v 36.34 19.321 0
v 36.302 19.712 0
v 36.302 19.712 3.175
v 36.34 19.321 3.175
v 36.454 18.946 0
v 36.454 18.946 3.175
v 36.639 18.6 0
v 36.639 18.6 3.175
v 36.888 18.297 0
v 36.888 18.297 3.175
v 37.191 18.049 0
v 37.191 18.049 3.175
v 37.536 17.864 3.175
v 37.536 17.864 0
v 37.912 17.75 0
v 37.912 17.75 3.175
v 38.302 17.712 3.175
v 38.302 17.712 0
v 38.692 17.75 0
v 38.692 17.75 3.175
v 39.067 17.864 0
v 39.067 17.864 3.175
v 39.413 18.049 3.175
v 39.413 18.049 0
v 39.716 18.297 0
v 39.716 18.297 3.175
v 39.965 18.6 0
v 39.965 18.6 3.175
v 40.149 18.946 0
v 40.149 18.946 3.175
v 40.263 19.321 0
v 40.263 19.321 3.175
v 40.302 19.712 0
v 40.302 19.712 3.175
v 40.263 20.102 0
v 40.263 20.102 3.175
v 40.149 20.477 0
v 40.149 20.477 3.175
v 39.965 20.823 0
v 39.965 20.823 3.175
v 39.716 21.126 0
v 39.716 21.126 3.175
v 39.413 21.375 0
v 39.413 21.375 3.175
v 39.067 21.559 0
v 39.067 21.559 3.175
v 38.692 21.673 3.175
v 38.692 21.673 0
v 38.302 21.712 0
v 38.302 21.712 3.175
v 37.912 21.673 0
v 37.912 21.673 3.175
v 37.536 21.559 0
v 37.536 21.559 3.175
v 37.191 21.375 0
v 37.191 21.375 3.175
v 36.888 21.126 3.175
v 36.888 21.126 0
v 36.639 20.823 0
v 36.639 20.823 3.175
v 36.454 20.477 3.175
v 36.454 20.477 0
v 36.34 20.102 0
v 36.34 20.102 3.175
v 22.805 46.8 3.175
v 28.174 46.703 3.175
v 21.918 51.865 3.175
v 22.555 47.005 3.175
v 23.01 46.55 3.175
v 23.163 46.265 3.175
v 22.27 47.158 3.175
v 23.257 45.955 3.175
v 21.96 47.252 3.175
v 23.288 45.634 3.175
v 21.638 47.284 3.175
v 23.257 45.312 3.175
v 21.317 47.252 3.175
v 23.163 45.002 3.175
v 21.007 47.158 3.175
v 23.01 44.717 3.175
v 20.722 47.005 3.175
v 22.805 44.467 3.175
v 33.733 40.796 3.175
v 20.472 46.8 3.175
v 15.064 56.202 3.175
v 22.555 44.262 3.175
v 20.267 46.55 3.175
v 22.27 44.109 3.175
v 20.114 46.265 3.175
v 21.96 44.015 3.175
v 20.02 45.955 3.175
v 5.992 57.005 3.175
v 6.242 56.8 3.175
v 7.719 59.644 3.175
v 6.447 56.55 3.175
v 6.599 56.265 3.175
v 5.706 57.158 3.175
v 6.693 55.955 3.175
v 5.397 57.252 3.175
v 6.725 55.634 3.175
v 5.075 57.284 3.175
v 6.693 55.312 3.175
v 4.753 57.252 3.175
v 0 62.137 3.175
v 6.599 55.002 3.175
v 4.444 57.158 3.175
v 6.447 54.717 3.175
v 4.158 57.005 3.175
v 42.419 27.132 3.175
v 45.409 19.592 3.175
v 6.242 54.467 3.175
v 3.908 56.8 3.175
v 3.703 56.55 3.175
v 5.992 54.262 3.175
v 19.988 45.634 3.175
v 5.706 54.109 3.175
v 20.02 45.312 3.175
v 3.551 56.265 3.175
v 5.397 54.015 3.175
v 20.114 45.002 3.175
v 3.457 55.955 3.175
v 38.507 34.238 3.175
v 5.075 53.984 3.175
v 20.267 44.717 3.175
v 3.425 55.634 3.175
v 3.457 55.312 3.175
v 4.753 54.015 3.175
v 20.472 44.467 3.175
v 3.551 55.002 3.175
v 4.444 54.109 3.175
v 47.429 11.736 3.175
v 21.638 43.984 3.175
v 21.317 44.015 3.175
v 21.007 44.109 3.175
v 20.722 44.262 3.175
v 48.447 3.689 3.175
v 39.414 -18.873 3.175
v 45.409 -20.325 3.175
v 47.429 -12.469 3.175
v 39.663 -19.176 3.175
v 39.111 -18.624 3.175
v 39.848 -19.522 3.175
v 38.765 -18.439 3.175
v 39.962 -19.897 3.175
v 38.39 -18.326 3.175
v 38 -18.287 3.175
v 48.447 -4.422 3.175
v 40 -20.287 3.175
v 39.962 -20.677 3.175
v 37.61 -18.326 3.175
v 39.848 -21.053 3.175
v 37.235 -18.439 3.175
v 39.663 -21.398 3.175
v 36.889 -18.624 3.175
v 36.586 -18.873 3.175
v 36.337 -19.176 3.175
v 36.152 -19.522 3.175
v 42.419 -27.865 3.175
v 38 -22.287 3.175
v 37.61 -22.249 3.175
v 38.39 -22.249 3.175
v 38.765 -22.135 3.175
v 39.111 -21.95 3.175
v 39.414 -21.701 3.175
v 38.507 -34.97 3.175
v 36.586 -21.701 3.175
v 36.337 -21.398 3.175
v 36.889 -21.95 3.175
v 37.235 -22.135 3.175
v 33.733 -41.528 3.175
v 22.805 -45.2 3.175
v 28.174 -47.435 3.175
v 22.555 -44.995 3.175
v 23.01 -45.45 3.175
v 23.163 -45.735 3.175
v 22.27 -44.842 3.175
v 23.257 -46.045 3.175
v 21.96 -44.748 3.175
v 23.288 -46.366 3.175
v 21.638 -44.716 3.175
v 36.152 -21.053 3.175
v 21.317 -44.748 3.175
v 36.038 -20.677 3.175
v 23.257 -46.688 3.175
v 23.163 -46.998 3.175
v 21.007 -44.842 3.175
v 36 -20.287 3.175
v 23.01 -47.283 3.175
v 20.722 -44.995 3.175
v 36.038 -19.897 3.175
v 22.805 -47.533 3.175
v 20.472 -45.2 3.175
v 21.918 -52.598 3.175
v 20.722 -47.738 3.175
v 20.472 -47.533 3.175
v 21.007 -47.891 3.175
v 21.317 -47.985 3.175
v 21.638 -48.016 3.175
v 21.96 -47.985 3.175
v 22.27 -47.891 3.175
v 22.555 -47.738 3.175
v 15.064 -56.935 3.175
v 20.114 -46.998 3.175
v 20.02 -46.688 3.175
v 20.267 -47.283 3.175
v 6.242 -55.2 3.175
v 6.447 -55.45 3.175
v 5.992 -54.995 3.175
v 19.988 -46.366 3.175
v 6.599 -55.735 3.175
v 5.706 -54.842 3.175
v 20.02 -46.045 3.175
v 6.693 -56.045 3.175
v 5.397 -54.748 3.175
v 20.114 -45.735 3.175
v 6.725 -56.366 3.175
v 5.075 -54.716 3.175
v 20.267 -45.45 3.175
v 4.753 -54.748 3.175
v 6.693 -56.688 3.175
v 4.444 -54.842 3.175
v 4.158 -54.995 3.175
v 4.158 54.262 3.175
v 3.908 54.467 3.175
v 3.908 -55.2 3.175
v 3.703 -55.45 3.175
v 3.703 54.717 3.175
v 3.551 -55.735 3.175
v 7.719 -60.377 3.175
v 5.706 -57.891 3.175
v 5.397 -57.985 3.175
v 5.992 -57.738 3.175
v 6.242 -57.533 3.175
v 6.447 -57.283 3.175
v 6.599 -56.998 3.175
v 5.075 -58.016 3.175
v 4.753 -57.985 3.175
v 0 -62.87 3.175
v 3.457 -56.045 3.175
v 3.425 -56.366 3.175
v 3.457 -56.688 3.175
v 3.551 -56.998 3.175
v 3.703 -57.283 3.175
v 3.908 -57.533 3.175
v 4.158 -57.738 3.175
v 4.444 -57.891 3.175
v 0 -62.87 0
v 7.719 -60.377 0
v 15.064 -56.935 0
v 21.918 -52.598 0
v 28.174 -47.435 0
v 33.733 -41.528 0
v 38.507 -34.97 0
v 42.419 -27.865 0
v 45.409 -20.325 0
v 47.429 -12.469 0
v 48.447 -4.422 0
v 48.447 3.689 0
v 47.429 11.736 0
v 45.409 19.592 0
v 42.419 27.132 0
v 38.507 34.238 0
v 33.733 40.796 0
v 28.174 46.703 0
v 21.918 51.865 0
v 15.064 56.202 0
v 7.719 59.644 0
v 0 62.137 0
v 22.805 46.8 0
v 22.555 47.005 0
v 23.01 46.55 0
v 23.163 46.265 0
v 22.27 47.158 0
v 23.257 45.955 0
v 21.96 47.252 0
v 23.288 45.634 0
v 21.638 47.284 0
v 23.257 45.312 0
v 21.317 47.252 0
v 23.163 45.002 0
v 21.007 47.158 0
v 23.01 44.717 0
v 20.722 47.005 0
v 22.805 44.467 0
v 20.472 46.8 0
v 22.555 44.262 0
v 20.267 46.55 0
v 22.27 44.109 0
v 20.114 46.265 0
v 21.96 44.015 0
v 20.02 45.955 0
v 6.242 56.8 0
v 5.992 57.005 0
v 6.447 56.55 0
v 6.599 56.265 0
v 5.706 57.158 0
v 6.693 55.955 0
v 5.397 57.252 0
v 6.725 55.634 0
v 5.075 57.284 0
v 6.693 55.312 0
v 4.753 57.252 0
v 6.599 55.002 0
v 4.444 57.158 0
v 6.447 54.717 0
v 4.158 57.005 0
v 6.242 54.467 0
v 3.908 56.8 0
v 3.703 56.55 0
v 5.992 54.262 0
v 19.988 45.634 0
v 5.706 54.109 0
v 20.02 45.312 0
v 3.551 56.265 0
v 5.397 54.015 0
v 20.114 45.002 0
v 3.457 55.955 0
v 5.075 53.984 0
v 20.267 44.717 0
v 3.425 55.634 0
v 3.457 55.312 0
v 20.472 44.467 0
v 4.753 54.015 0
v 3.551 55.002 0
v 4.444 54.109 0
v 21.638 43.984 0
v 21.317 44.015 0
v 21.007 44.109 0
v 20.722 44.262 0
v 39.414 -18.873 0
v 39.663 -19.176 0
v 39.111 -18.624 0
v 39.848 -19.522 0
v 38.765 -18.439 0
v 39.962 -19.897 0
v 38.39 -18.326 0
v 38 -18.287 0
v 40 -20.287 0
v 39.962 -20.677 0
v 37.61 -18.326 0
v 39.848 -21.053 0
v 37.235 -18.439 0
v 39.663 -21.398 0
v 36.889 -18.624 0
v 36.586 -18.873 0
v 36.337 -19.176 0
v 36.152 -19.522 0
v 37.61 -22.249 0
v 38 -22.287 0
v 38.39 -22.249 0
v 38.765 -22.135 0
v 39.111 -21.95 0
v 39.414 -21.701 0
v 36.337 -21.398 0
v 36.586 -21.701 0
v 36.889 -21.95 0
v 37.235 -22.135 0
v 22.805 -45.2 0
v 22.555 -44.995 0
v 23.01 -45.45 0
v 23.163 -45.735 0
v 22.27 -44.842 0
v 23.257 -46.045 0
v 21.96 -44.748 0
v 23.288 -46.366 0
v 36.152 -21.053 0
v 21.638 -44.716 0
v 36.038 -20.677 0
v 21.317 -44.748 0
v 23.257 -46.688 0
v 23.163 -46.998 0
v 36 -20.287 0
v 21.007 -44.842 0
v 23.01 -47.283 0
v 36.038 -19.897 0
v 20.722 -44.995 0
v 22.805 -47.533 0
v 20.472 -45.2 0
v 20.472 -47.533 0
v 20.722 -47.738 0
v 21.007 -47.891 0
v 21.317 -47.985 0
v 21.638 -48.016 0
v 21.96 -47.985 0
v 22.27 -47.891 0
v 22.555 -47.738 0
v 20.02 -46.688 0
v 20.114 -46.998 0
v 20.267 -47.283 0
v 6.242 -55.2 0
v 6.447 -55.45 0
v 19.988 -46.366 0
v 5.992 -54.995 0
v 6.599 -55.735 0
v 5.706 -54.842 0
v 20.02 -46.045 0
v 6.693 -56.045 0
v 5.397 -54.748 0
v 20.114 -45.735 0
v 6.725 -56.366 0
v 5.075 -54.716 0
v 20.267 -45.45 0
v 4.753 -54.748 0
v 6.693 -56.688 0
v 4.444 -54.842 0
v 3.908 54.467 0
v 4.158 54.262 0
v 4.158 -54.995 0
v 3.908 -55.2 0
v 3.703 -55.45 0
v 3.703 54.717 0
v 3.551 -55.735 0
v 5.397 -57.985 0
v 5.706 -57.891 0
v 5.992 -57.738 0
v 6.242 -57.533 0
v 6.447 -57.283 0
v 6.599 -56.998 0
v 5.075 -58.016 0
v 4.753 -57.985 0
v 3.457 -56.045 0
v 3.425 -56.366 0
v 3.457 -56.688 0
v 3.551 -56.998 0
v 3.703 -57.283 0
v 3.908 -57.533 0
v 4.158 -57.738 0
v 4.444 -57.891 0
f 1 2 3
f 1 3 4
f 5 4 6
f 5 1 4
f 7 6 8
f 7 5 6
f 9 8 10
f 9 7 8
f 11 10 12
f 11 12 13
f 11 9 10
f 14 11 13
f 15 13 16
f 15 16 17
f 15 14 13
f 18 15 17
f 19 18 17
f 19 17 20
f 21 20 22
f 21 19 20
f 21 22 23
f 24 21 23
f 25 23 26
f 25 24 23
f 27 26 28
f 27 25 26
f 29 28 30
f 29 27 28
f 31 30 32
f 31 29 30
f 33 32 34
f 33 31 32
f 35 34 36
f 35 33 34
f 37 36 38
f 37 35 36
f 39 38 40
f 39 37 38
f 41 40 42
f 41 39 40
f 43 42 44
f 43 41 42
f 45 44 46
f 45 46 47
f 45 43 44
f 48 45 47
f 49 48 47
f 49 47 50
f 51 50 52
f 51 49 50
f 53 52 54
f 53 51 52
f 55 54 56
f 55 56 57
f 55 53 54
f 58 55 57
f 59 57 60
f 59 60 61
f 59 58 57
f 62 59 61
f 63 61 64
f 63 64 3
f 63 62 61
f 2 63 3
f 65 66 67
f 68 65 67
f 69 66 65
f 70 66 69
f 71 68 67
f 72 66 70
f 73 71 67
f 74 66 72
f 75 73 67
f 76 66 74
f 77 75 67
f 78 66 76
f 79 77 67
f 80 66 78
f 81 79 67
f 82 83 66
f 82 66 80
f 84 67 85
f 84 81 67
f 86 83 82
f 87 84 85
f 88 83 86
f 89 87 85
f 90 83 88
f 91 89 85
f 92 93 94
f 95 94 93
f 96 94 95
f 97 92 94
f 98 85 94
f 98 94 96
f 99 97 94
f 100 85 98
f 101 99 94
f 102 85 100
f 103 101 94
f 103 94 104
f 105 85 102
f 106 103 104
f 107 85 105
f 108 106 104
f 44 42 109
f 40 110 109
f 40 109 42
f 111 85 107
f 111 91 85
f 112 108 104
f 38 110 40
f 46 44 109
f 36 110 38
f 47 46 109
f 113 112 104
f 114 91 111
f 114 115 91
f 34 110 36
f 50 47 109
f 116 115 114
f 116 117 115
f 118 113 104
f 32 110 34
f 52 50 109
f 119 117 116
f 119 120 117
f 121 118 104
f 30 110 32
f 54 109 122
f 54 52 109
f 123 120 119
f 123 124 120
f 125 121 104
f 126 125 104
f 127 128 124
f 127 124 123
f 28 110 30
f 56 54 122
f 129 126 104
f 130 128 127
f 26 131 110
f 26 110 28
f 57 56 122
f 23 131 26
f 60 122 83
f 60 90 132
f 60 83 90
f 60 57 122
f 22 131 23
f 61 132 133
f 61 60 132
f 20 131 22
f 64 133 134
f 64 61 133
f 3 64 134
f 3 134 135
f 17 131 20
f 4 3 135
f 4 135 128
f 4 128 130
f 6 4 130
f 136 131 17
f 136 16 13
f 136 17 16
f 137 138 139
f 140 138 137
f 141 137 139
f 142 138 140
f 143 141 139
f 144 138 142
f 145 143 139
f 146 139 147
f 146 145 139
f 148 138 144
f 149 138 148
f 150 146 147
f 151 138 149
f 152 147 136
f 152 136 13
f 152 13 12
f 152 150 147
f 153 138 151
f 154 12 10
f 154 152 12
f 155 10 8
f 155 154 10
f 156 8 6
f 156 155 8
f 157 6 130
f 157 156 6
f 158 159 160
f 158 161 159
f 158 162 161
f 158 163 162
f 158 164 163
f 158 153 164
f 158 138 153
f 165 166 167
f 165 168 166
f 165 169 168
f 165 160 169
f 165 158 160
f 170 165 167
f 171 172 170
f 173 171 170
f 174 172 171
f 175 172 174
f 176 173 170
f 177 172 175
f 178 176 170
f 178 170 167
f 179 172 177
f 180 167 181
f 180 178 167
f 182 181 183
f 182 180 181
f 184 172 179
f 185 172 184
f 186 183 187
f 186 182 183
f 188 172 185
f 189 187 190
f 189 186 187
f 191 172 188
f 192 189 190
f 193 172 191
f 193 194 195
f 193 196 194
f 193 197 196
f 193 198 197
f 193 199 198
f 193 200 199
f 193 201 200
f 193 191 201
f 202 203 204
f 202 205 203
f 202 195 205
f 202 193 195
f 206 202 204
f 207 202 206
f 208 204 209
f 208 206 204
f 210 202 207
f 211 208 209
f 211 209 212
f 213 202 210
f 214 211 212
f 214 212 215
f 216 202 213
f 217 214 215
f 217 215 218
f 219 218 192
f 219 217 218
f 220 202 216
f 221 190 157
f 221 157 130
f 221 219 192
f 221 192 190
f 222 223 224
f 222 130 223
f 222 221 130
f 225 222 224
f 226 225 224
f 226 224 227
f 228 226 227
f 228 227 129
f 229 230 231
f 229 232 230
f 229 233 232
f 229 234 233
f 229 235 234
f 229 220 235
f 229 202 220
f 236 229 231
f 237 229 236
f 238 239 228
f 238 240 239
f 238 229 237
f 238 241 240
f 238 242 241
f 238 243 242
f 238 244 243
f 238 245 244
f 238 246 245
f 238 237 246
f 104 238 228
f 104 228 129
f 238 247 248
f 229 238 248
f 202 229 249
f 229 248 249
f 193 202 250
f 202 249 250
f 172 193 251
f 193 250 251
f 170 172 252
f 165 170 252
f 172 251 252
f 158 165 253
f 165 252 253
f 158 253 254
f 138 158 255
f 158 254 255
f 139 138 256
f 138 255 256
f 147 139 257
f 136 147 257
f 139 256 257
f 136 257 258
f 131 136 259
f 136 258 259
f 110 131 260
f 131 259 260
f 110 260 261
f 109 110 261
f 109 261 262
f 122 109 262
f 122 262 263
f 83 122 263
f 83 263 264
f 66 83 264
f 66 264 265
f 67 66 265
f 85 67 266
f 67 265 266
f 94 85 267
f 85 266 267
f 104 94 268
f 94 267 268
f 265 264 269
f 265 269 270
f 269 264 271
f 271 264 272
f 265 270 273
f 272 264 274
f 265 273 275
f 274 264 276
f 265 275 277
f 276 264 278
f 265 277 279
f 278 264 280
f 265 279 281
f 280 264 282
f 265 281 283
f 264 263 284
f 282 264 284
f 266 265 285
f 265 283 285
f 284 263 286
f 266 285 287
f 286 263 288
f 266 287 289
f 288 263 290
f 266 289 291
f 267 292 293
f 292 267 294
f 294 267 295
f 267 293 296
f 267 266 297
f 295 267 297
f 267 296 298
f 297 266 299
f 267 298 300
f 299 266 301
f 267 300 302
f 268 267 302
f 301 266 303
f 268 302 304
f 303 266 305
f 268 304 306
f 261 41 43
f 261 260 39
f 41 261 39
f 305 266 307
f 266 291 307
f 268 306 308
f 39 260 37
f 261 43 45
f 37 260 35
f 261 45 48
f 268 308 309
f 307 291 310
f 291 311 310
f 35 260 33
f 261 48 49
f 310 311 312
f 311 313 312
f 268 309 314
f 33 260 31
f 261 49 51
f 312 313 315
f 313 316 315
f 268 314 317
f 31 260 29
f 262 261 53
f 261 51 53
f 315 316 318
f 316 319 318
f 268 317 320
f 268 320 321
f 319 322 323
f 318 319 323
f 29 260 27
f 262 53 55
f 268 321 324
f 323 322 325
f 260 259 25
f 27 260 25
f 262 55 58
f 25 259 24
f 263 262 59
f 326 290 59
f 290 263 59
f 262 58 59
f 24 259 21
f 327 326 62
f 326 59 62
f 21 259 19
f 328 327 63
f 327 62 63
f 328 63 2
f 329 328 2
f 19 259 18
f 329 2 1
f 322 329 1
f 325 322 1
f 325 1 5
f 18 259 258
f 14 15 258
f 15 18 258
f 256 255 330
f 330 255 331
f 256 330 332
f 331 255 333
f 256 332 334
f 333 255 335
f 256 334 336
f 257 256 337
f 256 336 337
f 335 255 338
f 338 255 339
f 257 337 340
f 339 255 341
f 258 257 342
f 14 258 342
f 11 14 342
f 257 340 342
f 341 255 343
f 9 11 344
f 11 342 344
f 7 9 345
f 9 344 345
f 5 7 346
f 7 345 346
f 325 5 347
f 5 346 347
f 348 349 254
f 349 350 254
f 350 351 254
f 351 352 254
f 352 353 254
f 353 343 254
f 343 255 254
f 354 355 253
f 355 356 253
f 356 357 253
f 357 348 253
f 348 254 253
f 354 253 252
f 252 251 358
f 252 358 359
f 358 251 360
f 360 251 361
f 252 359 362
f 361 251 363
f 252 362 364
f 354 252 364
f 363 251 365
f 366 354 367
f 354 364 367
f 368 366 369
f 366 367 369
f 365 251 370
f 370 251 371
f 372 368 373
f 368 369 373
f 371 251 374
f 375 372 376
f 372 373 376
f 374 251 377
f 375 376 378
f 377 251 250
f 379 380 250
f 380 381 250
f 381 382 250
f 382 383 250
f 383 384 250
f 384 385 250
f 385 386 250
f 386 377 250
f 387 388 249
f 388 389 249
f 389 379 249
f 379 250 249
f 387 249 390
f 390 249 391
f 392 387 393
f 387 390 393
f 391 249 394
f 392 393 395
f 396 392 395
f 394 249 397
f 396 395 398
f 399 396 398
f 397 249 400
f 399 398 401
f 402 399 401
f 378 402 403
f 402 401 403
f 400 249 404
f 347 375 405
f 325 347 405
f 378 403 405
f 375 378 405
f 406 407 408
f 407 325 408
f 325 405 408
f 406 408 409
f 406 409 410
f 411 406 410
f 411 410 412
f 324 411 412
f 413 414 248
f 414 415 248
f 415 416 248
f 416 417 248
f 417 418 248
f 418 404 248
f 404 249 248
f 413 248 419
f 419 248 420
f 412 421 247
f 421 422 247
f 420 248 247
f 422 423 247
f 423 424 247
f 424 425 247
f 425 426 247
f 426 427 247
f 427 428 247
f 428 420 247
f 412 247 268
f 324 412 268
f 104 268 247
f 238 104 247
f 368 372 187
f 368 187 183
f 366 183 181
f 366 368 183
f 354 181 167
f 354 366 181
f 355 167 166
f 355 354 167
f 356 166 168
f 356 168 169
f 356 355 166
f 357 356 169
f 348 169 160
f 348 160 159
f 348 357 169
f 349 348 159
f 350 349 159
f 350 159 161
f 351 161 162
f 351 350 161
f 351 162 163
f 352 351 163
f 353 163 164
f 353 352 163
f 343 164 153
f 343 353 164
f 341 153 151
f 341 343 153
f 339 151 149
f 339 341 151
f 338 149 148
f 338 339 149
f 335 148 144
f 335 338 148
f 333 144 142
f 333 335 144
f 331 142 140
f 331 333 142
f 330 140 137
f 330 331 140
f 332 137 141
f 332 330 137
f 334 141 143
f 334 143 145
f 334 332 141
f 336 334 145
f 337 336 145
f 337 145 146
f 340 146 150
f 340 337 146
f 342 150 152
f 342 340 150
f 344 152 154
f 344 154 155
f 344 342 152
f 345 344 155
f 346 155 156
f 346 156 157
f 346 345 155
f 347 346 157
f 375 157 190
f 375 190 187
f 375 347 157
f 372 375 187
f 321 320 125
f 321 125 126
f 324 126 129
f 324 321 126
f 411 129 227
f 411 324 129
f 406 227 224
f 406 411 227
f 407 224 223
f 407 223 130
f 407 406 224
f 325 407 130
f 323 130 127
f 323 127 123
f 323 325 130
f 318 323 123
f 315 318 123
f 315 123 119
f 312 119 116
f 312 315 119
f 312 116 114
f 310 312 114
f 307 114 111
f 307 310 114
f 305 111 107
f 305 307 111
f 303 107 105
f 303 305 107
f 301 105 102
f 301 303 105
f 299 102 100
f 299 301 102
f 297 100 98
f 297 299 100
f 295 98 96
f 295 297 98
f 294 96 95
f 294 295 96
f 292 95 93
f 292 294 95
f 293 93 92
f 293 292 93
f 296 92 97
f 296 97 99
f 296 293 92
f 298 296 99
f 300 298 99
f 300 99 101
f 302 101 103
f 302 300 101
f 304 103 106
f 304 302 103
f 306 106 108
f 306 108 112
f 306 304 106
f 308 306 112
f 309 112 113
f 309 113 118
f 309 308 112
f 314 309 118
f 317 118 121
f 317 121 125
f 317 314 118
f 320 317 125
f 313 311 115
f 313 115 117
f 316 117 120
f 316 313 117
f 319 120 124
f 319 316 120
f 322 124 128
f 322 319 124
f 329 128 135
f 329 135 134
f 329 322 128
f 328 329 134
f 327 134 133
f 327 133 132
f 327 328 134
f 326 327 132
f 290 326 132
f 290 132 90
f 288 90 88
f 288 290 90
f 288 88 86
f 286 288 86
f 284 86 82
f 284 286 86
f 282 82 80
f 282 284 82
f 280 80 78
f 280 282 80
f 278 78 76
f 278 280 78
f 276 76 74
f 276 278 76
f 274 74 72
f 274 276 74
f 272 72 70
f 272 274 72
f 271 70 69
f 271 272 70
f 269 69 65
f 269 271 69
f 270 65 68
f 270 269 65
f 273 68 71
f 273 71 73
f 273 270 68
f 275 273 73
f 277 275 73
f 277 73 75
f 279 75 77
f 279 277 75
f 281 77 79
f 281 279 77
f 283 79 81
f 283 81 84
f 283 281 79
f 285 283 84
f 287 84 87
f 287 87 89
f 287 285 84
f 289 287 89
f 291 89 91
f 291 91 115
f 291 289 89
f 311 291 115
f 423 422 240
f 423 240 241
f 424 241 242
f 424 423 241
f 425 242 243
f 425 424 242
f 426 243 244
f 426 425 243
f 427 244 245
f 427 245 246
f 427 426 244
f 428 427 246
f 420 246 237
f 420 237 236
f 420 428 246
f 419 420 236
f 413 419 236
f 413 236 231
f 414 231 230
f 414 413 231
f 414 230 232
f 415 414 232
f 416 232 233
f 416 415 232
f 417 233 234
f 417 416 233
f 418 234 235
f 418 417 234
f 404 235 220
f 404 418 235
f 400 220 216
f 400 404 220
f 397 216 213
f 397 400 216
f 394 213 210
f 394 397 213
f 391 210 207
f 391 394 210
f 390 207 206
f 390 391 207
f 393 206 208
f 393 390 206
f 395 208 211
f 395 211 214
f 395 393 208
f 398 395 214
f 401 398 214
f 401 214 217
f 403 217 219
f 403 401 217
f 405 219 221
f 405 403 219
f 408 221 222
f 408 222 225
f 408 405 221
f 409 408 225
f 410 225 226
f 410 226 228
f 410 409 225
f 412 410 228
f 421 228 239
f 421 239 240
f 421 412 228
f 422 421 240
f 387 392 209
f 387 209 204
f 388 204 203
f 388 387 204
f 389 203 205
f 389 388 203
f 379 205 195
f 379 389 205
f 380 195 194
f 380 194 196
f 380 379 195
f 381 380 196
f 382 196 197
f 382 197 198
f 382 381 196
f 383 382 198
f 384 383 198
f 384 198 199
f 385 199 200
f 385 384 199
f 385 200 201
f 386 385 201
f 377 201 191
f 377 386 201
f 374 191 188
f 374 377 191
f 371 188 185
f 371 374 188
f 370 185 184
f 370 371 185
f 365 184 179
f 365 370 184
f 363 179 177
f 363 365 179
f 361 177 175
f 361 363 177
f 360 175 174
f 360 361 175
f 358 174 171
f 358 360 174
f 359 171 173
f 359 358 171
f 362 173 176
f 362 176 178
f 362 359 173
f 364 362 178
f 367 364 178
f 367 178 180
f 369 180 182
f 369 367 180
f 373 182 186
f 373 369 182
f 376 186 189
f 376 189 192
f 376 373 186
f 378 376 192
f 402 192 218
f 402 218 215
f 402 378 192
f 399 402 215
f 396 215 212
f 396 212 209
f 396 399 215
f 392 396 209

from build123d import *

# Parameters (mm, degrees)
SKETCH1_R           = 1.65
SKETCH1_R_2         = 2
BOSS_EXTRUDE1_DEPTH = 3.175


with BuildPart() as part:
    # Sketch1 → Boss-Extrude1 (new body)
    with BuildSketch(Plane(origin=(0, 0, 0), x_dir=(-1, 0, 0), z_dir=(0, 0, 1))):
        with BuildLine():
            Line((0, -62.136729163), (0, 62.869580678))
            ThreePointArc((0, 62.869580678), (-48.575, 0.366425758), (0, -62.136729163))
        make_face()
        with Locations((-5.075, 56.366425758)):
            Circle(SKETCH1_R, mode=Mode.SUBTRACT)
        with Locations((-21.638471196, 46.366425758)):
            Circle(SKETCH1_R, mode=Mode.SUBTRACT)
        with Locations((-5.075, -55.633574242)):
            Circle(SKETCH1_R, mode=Mode.SUBTRACT)
        with Locations((-21.638471196, -45.633574242)):
            Circle(SKETCH1_R, mode=Mode.SUBTRACT)
        with Locations((-38, 20.287222228)):
            Circle(SKETCH1_R_2, mode=Mode.SUBTRACT)
        with Locations((-38.301731617, -19.711639731)):
            Circle(SKETCH1_R_2, mode=Mode.SUBTRACT)
    extrude(amount=BOSS_EXTRUDE1_DEPTH)


solid = part.part
